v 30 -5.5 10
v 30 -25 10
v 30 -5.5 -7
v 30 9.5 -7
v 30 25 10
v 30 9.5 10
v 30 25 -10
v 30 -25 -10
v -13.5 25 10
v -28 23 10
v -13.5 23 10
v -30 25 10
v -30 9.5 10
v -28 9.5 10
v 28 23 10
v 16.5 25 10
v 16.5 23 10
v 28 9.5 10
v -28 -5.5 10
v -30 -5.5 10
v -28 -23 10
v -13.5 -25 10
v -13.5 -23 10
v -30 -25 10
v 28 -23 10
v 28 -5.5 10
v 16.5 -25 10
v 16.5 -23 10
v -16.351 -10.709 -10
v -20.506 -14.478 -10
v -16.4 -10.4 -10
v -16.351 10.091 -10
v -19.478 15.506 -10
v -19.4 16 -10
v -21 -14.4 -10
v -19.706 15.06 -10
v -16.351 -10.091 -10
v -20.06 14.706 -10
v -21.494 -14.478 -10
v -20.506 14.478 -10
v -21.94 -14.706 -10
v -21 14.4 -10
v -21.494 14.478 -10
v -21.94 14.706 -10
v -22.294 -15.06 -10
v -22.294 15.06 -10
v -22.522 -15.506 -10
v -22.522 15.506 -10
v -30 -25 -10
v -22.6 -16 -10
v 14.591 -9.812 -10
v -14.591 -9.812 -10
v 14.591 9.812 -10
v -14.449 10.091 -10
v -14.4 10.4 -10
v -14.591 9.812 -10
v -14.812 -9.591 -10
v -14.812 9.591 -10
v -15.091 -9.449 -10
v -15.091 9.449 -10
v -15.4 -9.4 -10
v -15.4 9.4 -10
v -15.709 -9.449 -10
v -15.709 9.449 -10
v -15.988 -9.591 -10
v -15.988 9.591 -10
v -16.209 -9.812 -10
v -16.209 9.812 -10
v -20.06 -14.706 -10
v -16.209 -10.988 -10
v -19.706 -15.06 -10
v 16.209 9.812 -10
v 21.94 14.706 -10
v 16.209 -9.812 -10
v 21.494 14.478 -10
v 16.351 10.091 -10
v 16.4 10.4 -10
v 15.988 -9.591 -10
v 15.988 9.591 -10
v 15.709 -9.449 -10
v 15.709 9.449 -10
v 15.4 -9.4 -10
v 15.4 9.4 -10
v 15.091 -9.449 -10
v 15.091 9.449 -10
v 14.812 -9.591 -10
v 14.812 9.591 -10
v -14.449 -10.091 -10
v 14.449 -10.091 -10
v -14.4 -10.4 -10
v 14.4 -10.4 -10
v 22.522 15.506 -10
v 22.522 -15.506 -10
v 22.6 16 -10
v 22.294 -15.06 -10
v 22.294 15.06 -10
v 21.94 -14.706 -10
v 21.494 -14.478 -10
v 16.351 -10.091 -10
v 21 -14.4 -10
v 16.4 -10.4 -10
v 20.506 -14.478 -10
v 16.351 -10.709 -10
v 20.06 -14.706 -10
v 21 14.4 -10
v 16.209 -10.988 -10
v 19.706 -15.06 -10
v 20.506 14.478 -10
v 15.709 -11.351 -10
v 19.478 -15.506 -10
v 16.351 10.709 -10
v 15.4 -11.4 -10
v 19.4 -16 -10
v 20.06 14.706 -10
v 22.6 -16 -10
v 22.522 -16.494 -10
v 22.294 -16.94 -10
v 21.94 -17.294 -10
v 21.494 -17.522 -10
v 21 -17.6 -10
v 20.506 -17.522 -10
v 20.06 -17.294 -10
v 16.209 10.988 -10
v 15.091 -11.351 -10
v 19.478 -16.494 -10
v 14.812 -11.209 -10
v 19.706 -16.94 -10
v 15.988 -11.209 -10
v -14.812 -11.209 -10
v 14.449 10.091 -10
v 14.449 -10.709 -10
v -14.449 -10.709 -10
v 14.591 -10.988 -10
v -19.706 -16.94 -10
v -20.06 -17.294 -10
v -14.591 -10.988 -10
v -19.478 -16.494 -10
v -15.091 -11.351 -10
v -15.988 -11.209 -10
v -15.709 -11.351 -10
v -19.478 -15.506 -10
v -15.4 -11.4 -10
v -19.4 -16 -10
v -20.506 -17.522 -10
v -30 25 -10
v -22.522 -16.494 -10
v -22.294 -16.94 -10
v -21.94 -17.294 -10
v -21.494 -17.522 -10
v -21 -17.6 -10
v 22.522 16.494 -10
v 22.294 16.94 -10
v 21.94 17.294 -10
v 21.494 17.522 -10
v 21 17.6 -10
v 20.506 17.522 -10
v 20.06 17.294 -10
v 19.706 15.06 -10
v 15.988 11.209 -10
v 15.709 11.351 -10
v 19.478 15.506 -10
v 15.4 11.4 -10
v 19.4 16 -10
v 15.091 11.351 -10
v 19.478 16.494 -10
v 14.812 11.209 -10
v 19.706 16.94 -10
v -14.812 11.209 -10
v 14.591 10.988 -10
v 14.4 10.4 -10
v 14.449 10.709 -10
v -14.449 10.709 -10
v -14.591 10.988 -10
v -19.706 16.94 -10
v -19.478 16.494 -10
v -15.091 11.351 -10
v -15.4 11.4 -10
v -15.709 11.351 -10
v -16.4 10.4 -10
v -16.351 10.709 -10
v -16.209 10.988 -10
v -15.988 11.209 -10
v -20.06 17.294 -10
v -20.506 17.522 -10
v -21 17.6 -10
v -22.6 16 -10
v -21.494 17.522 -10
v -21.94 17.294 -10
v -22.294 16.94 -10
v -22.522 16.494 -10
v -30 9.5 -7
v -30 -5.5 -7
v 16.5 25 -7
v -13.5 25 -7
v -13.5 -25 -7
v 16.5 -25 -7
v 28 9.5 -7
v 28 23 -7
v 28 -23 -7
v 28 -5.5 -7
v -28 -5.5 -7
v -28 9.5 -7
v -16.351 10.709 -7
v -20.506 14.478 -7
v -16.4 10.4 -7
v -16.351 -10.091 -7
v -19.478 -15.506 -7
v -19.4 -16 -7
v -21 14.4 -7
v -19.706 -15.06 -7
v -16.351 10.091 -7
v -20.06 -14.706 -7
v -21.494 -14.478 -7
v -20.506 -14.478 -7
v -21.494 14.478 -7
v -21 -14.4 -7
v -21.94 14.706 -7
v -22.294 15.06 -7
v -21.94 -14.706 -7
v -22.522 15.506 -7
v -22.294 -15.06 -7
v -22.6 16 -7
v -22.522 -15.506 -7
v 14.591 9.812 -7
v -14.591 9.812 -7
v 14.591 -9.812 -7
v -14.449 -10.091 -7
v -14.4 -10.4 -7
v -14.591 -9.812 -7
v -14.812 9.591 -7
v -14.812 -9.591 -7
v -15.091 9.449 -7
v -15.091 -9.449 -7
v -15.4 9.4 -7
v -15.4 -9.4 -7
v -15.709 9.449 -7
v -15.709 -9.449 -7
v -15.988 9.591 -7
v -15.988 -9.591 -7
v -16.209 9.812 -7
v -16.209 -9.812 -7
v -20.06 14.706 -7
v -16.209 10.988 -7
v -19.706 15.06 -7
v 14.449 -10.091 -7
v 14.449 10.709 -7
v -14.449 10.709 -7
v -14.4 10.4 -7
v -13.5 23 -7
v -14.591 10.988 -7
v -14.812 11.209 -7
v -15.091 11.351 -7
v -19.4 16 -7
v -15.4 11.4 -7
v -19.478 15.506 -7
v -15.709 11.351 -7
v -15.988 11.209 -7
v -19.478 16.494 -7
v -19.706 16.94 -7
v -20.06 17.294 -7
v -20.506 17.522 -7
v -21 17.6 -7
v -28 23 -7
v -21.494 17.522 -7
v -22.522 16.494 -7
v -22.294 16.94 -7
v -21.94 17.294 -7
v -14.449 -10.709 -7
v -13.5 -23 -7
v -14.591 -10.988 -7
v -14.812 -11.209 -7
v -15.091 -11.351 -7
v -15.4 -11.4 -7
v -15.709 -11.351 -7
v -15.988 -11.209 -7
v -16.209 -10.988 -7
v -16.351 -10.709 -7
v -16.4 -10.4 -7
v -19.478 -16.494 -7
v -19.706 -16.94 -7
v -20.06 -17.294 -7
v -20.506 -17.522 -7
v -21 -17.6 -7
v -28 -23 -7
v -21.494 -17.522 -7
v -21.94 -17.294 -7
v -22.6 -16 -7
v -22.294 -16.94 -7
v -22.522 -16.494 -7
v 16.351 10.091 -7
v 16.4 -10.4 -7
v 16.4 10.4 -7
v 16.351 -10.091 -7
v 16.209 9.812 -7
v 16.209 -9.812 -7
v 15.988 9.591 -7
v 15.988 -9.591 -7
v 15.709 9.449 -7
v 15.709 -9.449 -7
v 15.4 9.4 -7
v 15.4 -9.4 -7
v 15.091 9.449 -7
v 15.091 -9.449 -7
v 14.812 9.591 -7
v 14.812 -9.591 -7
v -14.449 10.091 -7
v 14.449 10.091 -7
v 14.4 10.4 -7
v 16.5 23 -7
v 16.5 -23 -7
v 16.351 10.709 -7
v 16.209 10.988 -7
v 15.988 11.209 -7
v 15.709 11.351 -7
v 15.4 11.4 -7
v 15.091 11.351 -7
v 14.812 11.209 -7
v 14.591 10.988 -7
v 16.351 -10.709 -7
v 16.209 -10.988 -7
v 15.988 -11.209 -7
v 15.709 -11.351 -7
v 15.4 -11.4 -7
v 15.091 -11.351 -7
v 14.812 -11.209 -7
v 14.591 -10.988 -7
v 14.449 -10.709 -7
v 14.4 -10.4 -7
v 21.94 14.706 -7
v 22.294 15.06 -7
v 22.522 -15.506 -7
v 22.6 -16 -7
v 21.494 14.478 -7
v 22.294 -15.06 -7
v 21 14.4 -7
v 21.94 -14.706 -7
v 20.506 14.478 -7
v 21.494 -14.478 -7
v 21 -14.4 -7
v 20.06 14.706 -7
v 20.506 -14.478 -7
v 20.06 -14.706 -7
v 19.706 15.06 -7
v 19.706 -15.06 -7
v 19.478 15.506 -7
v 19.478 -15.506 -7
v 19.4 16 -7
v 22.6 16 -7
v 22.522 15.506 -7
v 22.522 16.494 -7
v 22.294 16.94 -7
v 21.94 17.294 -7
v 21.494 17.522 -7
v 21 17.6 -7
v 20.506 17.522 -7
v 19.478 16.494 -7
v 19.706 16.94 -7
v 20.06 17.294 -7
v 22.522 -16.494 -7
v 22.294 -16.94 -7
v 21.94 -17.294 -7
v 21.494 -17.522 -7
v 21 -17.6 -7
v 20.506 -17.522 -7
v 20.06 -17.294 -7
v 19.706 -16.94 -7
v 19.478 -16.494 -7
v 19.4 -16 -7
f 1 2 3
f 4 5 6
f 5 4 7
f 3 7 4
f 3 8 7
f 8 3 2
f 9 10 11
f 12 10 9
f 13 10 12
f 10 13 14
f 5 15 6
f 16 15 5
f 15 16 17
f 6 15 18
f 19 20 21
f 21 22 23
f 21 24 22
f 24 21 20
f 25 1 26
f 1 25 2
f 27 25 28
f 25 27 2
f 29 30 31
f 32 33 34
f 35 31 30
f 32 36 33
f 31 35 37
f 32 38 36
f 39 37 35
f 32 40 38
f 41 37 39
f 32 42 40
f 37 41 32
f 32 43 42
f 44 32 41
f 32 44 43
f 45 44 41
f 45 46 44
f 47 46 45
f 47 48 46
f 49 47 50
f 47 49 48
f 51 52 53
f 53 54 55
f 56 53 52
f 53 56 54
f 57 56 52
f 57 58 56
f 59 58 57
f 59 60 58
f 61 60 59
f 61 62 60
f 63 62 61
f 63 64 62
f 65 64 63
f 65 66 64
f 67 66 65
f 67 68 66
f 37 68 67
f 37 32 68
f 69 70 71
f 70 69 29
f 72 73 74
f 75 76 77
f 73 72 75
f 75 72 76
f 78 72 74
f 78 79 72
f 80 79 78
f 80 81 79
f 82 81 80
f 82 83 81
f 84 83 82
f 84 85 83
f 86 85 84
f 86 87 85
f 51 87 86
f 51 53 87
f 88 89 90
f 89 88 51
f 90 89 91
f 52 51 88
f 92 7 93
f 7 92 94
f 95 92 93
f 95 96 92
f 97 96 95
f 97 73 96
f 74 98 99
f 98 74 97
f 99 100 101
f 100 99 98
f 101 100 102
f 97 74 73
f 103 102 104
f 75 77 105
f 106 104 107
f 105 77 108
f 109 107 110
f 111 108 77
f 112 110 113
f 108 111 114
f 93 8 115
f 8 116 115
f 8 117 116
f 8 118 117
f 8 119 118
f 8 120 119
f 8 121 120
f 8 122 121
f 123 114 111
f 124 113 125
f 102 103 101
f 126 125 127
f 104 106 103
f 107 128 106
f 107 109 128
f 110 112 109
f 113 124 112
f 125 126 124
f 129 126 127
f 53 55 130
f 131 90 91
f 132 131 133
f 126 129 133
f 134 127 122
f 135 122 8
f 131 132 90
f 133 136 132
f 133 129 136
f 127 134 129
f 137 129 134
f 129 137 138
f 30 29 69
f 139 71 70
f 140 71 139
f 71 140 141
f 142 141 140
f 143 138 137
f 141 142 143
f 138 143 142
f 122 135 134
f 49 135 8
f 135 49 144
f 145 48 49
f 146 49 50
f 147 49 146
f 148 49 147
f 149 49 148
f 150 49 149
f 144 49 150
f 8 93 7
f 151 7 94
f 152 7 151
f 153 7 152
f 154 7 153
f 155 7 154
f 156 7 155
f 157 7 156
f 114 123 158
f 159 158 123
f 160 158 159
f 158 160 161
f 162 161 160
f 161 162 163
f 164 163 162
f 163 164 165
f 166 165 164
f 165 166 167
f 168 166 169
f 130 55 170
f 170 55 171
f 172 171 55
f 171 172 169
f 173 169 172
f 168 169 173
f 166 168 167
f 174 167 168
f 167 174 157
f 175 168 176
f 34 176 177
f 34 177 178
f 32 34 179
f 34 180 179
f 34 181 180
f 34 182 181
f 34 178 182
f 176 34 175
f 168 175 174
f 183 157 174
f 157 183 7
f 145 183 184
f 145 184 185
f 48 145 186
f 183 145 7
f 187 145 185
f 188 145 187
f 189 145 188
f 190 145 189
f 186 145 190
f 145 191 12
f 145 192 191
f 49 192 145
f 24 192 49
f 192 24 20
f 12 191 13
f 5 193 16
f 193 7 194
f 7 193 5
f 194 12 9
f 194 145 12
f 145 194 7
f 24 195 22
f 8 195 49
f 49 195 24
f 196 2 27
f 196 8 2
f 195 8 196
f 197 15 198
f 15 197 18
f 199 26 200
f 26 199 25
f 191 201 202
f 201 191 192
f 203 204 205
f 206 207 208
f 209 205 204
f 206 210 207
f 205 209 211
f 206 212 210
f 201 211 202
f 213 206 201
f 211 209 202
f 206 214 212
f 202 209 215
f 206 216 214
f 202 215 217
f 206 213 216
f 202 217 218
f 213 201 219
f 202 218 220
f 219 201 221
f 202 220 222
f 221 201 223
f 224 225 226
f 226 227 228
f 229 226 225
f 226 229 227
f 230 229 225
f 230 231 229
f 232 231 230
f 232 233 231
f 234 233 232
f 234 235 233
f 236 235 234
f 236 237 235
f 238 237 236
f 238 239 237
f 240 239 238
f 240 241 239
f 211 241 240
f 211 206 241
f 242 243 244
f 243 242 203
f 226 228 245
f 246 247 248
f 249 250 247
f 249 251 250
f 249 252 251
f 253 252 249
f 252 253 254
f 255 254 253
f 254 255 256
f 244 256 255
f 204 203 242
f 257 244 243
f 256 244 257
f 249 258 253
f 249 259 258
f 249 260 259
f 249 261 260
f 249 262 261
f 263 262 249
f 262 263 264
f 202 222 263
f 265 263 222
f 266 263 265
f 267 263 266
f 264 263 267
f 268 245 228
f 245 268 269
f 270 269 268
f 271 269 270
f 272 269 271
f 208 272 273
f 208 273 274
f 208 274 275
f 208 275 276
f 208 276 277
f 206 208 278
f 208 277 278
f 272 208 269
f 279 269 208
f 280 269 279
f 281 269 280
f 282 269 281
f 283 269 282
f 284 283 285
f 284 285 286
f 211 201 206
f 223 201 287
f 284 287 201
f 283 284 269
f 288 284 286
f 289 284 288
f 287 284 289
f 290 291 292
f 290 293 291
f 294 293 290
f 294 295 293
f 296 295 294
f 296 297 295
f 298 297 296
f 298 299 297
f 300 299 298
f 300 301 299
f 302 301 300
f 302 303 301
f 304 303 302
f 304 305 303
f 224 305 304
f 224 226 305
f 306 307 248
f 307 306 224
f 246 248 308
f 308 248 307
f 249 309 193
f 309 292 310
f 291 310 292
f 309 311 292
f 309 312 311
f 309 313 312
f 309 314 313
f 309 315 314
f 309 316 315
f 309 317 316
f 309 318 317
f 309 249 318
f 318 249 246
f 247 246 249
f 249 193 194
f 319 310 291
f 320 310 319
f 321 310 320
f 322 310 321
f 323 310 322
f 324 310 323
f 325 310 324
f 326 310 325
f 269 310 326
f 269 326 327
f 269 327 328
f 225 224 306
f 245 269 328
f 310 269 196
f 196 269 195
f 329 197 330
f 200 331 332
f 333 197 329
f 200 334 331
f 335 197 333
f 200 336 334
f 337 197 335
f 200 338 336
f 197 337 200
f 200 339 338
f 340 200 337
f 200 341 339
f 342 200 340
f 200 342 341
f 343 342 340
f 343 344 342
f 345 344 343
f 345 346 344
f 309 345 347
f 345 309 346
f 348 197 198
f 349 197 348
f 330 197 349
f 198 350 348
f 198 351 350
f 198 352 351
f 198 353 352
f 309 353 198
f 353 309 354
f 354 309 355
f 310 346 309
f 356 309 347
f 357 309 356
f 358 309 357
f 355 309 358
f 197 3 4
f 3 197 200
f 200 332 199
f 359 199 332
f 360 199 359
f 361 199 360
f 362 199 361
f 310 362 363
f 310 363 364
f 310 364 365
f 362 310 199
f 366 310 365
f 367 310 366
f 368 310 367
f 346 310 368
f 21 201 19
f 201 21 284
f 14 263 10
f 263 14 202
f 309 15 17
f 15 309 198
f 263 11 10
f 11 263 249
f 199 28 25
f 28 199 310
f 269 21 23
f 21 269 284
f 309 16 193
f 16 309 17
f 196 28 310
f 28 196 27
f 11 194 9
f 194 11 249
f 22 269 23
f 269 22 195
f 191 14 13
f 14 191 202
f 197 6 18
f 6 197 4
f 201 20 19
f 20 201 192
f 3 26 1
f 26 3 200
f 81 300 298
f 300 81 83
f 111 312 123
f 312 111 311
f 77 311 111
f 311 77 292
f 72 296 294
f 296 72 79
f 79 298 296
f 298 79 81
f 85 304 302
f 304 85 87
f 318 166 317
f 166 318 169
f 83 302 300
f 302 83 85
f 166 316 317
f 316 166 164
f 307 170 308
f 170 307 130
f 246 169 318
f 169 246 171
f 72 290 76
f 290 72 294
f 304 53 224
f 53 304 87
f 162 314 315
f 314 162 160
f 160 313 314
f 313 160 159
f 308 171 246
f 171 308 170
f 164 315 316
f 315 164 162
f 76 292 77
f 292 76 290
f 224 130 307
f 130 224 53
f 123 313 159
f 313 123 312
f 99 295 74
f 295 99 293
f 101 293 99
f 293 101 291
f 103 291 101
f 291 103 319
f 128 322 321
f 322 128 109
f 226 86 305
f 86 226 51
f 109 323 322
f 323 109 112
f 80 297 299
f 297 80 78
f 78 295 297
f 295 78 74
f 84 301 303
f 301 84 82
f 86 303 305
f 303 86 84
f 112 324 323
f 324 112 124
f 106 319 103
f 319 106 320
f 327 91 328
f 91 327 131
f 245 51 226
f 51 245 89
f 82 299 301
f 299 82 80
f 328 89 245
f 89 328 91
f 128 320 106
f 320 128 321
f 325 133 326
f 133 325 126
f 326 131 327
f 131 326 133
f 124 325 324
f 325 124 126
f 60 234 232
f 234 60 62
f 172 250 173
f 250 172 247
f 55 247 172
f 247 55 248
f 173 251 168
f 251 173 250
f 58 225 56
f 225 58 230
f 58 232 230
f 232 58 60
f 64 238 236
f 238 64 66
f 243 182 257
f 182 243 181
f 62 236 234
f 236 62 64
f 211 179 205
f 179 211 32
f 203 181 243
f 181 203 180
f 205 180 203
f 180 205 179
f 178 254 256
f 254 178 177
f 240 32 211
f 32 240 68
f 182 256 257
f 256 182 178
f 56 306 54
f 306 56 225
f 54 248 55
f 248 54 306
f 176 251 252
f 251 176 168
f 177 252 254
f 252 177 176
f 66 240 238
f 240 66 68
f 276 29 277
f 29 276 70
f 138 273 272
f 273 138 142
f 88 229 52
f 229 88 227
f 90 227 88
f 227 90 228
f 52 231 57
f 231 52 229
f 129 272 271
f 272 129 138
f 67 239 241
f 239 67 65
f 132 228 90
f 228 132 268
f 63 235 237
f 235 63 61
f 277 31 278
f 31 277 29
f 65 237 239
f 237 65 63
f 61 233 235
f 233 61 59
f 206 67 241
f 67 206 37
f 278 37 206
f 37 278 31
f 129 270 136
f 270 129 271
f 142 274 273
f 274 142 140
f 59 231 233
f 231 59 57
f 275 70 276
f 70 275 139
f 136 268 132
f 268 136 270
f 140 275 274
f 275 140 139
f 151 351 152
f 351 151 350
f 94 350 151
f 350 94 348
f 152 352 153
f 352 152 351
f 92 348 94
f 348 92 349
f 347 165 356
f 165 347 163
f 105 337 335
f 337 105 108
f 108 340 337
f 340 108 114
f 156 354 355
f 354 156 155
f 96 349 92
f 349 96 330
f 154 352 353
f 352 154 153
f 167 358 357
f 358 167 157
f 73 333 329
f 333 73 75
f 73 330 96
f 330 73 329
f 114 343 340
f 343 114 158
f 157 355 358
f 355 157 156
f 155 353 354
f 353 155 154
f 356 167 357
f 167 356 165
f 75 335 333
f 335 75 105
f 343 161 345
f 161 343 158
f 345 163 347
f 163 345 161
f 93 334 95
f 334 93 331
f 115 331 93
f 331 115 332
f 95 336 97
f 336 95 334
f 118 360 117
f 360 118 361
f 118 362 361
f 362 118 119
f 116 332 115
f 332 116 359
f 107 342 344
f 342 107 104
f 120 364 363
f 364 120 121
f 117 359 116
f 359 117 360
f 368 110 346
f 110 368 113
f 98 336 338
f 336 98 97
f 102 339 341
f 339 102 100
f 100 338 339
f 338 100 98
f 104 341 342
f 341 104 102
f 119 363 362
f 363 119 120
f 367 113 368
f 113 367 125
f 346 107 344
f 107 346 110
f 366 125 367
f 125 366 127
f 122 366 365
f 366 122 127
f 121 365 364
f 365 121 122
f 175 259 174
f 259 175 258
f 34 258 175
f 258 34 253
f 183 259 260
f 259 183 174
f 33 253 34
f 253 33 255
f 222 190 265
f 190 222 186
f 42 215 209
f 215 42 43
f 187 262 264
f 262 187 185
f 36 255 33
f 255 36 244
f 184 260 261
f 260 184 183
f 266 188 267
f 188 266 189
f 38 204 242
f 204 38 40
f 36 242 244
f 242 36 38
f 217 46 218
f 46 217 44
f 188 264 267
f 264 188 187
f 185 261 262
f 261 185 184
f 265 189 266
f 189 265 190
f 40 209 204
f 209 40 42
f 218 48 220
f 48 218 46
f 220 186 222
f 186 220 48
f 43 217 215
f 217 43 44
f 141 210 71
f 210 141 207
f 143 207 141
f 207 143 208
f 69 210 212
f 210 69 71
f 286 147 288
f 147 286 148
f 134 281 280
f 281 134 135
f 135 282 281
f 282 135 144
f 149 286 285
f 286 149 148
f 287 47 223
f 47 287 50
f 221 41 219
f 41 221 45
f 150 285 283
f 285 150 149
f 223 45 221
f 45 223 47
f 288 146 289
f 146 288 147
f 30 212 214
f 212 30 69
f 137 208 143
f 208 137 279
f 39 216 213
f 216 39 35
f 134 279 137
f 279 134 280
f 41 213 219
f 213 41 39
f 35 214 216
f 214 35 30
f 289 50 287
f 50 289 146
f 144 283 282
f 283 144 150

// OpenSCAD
// Case enclosure for:
//   single Sparkfun SX1509 I/O Expander board
//

// Number of facets for cylinders
$fn = 20;

enclosure_x_dim = 60;
enclosure_y_dim = 50;
enclosure_height = 20;

sx1509_standoff_x_offset = 15.4;
sx1509_standoff_y_offset = 10.4;
standoff_hole_radius = 1;

mount_x_offset = 21;
mount_y_offset = 16;
mount_hole_radius = 1.6;

base_thickness = 3;
wall_width = 2;
wall_height = enclosure_height;

BELOW_PLANE = -1;
INF = 100000;


difference() {
    // outer extents
    cube([enclosure_x_dim ,enclosure_y_dim ,enclosure_height], center = true);

    // cutout inside to form walls
    translate([0,   0, base_thickness])cube([enclosure_x_dim -(2*wall_width),enclosure_y_dim -(2*wall_width), wall_height], center = true);
 
    // I/O side cuts
    translate([1.5, 0, base_thickness])cube([30,INF,wall_height], center = true);
    translate([0,   2, base_thickness])cube([INF,15,wall_height], center = true);
         
    // SX1509 mounting holes
    translate([sx1509_standoff_x_offset,sx1509_standoff_y_offset, BELOW_PLANE])   cylinder(r=standoff_hole_radius, h=INF, center=true);
    translate([sx1509_standoff_x_offset,-sx1509_standoff_y_offset, BELOW_PLANE])  cylinder(r=standoff_hole_radius, h=INF, center=true);
    translate([-sx1509_standoff_x_offset,sx1509_standoff_y_offset, BELOW_PLANE])  cylinder(r=standoff_hole_radius, h=INF, center=true);
    translate([-sx1509_standoff_x_offset,-sx1509_standoff_y_offset, BELOW_PLANE]) cylinder(r=standoff_hole_radius, h=INF, center=true);

    // Enclosure mounting holes
    translate([mount_x_offset,mount_y_offset, BELOW_PLANE])   cylinder(r=mount_hole_radius, h=INF, center=true);
    translate([mount_x_offset,-mount_y_offset, BELOW_PLANE])  cylinder(r=mount_hole_radius, h=INF, center=true);
    translate([-mount_x_offset,mount_y_offset, BELOW_PLANE])  cylinder(r=mount_hole_radius, h=INF, center=true);
    translate([-mount_x_offset,-mount_y_offset, BELOW_PLANE]) cylinder(r=mount_hole_radius, h=INF, center=true);
}
